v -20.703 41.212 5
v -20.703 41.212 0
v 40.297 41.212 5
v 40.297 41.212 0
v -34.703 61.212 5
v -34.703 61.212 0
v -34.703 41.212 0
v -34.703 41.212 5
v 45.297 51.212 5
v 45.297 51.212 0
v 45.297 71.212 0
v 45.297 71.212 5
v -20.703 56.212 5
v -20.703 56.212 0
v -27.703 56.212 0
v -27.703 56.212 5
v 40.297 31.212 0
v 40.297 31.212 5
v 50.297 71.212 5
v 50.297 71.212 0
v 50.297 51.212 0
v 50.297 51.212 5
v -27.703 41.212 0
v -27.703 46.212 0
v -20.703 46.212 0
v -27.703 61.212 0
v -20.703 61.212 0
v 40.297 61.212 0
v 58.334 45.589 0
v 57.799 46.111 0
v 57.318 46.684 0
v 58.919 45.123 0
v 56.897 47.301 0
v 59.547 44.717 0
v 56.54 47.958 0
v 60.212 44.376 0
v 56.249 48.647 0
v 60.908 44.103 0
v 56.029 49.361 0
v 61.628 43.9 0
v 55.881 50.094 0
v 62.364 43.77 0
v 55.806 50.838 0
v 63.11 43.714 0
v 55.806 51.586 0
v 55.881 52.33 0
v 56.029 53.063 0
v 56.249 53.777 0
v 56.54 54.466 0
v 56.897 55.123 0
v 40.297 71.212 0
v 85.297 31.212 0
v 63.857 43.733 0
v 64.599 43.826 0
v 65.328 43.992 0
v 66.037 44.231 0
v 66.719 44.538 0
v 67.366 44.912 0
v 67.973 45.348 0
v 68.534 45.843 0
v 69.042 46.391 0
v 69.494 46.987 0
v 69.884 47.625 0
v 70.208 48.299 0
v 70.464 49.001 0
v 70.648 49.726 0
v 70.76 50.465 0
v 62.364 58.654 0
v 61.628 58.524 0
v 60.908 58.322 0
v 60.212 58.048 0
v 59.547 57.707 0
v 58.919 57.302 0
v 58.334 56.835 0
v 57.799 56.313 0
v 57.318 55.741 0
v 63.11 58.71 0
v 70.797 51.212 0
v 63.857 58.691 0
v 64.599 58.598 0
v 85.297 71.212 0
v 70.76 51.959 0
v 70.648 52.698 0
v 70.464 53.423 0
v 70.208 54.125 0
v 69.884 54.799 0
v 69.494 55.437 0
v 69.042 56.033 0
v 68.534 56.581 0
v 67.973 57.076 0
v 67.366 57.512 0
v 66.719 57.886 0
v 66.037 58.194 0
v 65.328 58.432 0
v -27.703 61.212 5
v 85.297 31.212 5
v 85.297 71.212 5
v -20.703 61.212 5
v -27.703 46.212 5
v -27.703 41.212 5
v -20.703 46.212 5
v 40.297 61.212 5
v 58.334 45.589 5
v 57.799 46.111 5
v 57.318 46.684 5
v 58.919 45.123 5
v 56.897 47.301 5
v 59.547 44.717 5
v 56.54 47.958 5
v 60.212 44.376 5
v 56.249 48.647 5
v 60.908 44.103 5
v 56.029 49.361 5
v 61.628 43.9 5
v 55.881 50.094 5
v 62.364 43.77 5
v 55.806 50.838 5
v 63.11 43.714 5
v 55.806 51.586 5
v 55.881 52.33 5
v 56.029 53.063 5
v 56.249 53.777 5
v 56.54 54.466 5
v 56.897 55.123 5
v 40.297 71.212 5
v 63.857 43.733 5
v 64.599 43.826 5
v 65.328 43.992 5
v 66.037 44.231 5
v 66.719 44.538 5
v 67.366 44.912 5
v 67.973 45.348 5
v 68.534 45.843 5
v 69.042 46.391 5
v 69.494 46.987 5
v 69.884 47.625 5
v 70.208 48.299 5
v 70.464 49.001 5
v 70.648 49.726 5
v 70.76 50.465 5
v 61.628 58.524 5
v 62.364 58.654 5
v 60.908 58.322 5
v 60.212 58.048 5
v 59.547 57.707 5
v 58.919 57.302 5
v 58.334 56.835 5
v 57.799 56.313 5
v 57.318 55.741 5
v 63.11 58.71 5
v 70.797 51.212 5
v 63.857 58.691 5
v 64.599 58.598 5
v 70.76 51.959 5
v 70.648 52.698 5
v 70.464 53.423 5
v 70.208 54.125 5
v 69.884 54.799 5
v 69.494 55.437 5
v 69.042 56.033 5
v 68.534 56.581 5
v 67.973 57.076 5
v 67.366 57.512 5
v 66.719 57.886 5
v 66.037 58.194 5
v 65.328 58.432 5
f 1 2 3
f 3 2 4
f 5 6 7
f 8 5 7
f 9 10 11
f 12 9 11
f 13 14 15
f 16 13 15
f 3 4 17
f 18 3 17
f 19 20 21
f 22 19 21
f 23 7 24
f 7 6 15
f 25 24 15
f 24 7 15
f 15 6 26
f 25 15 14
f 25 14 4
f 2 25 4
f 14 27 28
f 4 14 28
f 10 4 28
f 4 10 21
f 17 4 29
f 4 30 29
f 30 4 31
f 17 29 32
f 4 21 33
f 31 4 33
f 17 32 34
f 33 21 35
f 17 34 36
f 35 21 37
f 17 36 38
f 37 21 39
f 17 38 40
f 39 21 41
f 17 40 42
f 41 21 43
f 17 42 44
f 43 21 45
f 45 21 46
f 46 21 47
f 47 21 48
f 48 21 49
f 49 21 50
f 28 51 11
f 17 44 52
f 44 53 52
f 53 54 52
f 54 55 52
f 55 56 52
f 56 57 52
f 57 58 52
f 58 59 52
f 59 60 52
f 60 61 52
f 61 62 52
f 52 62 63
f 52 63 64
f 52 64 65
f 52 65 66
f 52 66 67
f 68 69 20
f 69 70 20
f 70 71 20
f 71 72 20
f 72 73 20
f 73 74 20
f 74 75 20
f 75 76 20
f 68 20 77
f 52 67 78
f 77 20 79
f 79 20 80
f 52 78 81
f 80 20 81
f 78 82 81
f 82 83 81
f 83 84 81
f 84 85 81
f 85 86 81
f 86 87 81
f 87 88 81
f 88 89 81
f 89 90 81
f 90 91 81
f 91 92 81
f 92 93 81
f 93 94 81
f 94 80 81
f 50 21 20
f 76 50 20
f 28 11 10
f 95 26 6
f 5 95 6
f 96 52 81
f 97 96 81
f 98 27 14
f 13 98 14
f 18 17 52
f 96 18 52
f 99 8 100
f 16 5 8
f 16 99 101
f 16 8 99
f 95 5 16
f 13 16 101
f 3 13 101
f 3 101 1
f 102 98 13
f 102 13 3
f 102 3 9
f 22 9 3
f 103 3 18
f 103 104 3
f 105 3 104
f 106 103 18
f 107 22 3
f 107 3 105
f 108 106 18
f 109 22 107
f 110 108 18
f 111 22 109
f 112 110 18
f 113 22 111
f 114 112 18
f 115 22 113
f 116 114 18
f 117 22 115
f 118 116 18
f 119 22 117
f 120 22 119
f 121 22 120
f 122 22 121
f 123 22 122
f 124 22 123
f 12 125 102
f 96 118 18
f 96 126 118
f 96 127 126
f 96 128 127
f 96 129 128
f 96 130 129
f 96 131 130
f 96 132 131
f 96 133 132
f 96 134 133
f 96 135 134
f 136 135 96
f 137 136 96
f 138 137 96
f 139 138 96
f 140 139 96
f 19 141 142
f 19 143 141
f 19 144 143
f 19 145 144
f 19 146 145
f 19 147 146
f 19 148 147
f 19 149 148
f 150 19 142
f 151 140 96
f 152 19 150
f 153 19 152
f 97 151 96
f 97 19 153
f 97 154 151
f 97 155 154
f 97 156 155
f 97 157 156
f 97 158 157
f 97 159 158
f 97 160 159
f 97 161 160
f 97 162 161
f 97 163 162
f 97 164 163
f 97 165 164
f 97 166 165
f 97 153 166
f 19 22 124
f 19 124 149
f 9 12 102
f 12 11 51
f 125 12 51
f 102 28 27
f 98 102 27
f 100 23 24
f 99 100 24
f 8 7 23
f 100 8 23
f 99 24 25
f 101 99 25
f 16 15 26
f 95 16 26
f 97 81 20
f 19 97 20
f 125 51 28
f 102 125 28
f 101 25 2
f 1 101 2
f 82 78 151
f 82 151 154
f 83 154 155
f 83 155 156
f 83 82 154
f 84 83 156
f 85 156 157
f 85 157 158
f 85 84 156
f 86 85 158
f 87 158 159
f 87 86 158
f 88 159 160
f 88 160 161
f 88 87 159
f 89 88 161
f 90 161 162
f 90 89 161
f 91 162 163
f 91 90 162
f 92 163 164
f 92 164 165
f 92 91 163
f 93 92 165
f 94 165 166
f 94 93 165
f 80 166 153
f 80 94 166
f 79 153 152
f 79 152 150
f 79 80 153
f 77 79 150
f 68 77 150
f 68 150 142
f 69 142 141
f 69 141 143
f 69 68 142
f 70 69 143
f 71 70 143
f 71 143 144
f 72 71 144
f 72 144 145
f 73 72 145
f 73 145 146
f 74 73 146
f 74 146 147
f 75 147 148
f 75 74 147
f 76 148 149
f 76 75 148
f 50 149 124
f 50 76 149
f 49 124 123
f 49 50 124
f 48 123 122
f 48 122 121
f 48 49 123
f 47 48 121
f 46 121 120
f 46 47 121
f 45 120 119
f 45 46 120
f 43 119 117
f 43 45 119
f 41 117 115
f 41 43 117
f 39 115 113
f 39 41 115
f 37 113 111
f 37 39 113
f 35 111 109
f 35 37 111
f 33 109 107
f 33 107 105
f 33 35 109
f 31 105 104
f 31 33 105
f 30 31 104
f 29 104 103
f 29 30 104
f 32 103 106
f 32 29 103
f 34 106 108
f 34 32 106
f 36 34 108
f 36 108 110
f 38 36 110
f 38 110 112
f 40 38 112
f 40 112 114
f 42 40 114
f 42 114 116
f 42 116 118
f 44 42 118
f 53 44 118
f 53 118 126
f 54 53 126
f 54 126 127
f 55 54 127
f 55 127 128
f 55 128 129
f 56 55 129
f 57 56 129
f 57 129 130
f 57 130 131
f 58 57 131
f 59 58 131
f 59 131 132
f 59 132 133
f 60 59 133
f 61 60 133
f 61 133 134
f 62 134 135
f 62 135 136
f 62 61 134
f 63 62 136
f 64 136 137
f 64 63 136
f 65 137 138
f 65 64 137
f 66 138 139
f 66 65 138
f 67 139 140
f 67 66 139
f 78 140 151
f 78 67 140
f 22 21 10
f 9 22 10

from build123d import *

# Parameters (mm, degrees)
F1_R     = 7.5
F2_DEPTH = 5


with BuildPart() as f2:
    # F1 (on Top) → F2 (new body)
    with BuildSketch(Plane.XY):
        Polygon((80.296967, 71.212121), (75.296967, 71.212121), (50.296967, 71.212121), (50.296967, 51.212121), (45.296967, 51.212121), (45.296967, 71.212121), (40.296967, 71.212121), (40.296967, 61.212121), (-20.703033, 61.212121), (-20.703033, 56.212121), (-27.703033, 56.212121), (-27.703033, 61.212121), (-34.703033, 61.212121), (-34.703033, 41.212121), (-27.703033, 41.212121), (-27.703033, 46.212121), (-20.703033, 46.212121), (-20.703033, 41.212121), (40.296967, 41.212121), (40.296967, 31.212121), (85.296967, 31.212121), (85.296967, 71.212121), align=None)
        with Locations((63.296967, 51.212121)):
            Circle(F1_R, mode=Mode.SUBTRACT)
    extrude(amount=F2_DEPTH)


solid = f2.part
